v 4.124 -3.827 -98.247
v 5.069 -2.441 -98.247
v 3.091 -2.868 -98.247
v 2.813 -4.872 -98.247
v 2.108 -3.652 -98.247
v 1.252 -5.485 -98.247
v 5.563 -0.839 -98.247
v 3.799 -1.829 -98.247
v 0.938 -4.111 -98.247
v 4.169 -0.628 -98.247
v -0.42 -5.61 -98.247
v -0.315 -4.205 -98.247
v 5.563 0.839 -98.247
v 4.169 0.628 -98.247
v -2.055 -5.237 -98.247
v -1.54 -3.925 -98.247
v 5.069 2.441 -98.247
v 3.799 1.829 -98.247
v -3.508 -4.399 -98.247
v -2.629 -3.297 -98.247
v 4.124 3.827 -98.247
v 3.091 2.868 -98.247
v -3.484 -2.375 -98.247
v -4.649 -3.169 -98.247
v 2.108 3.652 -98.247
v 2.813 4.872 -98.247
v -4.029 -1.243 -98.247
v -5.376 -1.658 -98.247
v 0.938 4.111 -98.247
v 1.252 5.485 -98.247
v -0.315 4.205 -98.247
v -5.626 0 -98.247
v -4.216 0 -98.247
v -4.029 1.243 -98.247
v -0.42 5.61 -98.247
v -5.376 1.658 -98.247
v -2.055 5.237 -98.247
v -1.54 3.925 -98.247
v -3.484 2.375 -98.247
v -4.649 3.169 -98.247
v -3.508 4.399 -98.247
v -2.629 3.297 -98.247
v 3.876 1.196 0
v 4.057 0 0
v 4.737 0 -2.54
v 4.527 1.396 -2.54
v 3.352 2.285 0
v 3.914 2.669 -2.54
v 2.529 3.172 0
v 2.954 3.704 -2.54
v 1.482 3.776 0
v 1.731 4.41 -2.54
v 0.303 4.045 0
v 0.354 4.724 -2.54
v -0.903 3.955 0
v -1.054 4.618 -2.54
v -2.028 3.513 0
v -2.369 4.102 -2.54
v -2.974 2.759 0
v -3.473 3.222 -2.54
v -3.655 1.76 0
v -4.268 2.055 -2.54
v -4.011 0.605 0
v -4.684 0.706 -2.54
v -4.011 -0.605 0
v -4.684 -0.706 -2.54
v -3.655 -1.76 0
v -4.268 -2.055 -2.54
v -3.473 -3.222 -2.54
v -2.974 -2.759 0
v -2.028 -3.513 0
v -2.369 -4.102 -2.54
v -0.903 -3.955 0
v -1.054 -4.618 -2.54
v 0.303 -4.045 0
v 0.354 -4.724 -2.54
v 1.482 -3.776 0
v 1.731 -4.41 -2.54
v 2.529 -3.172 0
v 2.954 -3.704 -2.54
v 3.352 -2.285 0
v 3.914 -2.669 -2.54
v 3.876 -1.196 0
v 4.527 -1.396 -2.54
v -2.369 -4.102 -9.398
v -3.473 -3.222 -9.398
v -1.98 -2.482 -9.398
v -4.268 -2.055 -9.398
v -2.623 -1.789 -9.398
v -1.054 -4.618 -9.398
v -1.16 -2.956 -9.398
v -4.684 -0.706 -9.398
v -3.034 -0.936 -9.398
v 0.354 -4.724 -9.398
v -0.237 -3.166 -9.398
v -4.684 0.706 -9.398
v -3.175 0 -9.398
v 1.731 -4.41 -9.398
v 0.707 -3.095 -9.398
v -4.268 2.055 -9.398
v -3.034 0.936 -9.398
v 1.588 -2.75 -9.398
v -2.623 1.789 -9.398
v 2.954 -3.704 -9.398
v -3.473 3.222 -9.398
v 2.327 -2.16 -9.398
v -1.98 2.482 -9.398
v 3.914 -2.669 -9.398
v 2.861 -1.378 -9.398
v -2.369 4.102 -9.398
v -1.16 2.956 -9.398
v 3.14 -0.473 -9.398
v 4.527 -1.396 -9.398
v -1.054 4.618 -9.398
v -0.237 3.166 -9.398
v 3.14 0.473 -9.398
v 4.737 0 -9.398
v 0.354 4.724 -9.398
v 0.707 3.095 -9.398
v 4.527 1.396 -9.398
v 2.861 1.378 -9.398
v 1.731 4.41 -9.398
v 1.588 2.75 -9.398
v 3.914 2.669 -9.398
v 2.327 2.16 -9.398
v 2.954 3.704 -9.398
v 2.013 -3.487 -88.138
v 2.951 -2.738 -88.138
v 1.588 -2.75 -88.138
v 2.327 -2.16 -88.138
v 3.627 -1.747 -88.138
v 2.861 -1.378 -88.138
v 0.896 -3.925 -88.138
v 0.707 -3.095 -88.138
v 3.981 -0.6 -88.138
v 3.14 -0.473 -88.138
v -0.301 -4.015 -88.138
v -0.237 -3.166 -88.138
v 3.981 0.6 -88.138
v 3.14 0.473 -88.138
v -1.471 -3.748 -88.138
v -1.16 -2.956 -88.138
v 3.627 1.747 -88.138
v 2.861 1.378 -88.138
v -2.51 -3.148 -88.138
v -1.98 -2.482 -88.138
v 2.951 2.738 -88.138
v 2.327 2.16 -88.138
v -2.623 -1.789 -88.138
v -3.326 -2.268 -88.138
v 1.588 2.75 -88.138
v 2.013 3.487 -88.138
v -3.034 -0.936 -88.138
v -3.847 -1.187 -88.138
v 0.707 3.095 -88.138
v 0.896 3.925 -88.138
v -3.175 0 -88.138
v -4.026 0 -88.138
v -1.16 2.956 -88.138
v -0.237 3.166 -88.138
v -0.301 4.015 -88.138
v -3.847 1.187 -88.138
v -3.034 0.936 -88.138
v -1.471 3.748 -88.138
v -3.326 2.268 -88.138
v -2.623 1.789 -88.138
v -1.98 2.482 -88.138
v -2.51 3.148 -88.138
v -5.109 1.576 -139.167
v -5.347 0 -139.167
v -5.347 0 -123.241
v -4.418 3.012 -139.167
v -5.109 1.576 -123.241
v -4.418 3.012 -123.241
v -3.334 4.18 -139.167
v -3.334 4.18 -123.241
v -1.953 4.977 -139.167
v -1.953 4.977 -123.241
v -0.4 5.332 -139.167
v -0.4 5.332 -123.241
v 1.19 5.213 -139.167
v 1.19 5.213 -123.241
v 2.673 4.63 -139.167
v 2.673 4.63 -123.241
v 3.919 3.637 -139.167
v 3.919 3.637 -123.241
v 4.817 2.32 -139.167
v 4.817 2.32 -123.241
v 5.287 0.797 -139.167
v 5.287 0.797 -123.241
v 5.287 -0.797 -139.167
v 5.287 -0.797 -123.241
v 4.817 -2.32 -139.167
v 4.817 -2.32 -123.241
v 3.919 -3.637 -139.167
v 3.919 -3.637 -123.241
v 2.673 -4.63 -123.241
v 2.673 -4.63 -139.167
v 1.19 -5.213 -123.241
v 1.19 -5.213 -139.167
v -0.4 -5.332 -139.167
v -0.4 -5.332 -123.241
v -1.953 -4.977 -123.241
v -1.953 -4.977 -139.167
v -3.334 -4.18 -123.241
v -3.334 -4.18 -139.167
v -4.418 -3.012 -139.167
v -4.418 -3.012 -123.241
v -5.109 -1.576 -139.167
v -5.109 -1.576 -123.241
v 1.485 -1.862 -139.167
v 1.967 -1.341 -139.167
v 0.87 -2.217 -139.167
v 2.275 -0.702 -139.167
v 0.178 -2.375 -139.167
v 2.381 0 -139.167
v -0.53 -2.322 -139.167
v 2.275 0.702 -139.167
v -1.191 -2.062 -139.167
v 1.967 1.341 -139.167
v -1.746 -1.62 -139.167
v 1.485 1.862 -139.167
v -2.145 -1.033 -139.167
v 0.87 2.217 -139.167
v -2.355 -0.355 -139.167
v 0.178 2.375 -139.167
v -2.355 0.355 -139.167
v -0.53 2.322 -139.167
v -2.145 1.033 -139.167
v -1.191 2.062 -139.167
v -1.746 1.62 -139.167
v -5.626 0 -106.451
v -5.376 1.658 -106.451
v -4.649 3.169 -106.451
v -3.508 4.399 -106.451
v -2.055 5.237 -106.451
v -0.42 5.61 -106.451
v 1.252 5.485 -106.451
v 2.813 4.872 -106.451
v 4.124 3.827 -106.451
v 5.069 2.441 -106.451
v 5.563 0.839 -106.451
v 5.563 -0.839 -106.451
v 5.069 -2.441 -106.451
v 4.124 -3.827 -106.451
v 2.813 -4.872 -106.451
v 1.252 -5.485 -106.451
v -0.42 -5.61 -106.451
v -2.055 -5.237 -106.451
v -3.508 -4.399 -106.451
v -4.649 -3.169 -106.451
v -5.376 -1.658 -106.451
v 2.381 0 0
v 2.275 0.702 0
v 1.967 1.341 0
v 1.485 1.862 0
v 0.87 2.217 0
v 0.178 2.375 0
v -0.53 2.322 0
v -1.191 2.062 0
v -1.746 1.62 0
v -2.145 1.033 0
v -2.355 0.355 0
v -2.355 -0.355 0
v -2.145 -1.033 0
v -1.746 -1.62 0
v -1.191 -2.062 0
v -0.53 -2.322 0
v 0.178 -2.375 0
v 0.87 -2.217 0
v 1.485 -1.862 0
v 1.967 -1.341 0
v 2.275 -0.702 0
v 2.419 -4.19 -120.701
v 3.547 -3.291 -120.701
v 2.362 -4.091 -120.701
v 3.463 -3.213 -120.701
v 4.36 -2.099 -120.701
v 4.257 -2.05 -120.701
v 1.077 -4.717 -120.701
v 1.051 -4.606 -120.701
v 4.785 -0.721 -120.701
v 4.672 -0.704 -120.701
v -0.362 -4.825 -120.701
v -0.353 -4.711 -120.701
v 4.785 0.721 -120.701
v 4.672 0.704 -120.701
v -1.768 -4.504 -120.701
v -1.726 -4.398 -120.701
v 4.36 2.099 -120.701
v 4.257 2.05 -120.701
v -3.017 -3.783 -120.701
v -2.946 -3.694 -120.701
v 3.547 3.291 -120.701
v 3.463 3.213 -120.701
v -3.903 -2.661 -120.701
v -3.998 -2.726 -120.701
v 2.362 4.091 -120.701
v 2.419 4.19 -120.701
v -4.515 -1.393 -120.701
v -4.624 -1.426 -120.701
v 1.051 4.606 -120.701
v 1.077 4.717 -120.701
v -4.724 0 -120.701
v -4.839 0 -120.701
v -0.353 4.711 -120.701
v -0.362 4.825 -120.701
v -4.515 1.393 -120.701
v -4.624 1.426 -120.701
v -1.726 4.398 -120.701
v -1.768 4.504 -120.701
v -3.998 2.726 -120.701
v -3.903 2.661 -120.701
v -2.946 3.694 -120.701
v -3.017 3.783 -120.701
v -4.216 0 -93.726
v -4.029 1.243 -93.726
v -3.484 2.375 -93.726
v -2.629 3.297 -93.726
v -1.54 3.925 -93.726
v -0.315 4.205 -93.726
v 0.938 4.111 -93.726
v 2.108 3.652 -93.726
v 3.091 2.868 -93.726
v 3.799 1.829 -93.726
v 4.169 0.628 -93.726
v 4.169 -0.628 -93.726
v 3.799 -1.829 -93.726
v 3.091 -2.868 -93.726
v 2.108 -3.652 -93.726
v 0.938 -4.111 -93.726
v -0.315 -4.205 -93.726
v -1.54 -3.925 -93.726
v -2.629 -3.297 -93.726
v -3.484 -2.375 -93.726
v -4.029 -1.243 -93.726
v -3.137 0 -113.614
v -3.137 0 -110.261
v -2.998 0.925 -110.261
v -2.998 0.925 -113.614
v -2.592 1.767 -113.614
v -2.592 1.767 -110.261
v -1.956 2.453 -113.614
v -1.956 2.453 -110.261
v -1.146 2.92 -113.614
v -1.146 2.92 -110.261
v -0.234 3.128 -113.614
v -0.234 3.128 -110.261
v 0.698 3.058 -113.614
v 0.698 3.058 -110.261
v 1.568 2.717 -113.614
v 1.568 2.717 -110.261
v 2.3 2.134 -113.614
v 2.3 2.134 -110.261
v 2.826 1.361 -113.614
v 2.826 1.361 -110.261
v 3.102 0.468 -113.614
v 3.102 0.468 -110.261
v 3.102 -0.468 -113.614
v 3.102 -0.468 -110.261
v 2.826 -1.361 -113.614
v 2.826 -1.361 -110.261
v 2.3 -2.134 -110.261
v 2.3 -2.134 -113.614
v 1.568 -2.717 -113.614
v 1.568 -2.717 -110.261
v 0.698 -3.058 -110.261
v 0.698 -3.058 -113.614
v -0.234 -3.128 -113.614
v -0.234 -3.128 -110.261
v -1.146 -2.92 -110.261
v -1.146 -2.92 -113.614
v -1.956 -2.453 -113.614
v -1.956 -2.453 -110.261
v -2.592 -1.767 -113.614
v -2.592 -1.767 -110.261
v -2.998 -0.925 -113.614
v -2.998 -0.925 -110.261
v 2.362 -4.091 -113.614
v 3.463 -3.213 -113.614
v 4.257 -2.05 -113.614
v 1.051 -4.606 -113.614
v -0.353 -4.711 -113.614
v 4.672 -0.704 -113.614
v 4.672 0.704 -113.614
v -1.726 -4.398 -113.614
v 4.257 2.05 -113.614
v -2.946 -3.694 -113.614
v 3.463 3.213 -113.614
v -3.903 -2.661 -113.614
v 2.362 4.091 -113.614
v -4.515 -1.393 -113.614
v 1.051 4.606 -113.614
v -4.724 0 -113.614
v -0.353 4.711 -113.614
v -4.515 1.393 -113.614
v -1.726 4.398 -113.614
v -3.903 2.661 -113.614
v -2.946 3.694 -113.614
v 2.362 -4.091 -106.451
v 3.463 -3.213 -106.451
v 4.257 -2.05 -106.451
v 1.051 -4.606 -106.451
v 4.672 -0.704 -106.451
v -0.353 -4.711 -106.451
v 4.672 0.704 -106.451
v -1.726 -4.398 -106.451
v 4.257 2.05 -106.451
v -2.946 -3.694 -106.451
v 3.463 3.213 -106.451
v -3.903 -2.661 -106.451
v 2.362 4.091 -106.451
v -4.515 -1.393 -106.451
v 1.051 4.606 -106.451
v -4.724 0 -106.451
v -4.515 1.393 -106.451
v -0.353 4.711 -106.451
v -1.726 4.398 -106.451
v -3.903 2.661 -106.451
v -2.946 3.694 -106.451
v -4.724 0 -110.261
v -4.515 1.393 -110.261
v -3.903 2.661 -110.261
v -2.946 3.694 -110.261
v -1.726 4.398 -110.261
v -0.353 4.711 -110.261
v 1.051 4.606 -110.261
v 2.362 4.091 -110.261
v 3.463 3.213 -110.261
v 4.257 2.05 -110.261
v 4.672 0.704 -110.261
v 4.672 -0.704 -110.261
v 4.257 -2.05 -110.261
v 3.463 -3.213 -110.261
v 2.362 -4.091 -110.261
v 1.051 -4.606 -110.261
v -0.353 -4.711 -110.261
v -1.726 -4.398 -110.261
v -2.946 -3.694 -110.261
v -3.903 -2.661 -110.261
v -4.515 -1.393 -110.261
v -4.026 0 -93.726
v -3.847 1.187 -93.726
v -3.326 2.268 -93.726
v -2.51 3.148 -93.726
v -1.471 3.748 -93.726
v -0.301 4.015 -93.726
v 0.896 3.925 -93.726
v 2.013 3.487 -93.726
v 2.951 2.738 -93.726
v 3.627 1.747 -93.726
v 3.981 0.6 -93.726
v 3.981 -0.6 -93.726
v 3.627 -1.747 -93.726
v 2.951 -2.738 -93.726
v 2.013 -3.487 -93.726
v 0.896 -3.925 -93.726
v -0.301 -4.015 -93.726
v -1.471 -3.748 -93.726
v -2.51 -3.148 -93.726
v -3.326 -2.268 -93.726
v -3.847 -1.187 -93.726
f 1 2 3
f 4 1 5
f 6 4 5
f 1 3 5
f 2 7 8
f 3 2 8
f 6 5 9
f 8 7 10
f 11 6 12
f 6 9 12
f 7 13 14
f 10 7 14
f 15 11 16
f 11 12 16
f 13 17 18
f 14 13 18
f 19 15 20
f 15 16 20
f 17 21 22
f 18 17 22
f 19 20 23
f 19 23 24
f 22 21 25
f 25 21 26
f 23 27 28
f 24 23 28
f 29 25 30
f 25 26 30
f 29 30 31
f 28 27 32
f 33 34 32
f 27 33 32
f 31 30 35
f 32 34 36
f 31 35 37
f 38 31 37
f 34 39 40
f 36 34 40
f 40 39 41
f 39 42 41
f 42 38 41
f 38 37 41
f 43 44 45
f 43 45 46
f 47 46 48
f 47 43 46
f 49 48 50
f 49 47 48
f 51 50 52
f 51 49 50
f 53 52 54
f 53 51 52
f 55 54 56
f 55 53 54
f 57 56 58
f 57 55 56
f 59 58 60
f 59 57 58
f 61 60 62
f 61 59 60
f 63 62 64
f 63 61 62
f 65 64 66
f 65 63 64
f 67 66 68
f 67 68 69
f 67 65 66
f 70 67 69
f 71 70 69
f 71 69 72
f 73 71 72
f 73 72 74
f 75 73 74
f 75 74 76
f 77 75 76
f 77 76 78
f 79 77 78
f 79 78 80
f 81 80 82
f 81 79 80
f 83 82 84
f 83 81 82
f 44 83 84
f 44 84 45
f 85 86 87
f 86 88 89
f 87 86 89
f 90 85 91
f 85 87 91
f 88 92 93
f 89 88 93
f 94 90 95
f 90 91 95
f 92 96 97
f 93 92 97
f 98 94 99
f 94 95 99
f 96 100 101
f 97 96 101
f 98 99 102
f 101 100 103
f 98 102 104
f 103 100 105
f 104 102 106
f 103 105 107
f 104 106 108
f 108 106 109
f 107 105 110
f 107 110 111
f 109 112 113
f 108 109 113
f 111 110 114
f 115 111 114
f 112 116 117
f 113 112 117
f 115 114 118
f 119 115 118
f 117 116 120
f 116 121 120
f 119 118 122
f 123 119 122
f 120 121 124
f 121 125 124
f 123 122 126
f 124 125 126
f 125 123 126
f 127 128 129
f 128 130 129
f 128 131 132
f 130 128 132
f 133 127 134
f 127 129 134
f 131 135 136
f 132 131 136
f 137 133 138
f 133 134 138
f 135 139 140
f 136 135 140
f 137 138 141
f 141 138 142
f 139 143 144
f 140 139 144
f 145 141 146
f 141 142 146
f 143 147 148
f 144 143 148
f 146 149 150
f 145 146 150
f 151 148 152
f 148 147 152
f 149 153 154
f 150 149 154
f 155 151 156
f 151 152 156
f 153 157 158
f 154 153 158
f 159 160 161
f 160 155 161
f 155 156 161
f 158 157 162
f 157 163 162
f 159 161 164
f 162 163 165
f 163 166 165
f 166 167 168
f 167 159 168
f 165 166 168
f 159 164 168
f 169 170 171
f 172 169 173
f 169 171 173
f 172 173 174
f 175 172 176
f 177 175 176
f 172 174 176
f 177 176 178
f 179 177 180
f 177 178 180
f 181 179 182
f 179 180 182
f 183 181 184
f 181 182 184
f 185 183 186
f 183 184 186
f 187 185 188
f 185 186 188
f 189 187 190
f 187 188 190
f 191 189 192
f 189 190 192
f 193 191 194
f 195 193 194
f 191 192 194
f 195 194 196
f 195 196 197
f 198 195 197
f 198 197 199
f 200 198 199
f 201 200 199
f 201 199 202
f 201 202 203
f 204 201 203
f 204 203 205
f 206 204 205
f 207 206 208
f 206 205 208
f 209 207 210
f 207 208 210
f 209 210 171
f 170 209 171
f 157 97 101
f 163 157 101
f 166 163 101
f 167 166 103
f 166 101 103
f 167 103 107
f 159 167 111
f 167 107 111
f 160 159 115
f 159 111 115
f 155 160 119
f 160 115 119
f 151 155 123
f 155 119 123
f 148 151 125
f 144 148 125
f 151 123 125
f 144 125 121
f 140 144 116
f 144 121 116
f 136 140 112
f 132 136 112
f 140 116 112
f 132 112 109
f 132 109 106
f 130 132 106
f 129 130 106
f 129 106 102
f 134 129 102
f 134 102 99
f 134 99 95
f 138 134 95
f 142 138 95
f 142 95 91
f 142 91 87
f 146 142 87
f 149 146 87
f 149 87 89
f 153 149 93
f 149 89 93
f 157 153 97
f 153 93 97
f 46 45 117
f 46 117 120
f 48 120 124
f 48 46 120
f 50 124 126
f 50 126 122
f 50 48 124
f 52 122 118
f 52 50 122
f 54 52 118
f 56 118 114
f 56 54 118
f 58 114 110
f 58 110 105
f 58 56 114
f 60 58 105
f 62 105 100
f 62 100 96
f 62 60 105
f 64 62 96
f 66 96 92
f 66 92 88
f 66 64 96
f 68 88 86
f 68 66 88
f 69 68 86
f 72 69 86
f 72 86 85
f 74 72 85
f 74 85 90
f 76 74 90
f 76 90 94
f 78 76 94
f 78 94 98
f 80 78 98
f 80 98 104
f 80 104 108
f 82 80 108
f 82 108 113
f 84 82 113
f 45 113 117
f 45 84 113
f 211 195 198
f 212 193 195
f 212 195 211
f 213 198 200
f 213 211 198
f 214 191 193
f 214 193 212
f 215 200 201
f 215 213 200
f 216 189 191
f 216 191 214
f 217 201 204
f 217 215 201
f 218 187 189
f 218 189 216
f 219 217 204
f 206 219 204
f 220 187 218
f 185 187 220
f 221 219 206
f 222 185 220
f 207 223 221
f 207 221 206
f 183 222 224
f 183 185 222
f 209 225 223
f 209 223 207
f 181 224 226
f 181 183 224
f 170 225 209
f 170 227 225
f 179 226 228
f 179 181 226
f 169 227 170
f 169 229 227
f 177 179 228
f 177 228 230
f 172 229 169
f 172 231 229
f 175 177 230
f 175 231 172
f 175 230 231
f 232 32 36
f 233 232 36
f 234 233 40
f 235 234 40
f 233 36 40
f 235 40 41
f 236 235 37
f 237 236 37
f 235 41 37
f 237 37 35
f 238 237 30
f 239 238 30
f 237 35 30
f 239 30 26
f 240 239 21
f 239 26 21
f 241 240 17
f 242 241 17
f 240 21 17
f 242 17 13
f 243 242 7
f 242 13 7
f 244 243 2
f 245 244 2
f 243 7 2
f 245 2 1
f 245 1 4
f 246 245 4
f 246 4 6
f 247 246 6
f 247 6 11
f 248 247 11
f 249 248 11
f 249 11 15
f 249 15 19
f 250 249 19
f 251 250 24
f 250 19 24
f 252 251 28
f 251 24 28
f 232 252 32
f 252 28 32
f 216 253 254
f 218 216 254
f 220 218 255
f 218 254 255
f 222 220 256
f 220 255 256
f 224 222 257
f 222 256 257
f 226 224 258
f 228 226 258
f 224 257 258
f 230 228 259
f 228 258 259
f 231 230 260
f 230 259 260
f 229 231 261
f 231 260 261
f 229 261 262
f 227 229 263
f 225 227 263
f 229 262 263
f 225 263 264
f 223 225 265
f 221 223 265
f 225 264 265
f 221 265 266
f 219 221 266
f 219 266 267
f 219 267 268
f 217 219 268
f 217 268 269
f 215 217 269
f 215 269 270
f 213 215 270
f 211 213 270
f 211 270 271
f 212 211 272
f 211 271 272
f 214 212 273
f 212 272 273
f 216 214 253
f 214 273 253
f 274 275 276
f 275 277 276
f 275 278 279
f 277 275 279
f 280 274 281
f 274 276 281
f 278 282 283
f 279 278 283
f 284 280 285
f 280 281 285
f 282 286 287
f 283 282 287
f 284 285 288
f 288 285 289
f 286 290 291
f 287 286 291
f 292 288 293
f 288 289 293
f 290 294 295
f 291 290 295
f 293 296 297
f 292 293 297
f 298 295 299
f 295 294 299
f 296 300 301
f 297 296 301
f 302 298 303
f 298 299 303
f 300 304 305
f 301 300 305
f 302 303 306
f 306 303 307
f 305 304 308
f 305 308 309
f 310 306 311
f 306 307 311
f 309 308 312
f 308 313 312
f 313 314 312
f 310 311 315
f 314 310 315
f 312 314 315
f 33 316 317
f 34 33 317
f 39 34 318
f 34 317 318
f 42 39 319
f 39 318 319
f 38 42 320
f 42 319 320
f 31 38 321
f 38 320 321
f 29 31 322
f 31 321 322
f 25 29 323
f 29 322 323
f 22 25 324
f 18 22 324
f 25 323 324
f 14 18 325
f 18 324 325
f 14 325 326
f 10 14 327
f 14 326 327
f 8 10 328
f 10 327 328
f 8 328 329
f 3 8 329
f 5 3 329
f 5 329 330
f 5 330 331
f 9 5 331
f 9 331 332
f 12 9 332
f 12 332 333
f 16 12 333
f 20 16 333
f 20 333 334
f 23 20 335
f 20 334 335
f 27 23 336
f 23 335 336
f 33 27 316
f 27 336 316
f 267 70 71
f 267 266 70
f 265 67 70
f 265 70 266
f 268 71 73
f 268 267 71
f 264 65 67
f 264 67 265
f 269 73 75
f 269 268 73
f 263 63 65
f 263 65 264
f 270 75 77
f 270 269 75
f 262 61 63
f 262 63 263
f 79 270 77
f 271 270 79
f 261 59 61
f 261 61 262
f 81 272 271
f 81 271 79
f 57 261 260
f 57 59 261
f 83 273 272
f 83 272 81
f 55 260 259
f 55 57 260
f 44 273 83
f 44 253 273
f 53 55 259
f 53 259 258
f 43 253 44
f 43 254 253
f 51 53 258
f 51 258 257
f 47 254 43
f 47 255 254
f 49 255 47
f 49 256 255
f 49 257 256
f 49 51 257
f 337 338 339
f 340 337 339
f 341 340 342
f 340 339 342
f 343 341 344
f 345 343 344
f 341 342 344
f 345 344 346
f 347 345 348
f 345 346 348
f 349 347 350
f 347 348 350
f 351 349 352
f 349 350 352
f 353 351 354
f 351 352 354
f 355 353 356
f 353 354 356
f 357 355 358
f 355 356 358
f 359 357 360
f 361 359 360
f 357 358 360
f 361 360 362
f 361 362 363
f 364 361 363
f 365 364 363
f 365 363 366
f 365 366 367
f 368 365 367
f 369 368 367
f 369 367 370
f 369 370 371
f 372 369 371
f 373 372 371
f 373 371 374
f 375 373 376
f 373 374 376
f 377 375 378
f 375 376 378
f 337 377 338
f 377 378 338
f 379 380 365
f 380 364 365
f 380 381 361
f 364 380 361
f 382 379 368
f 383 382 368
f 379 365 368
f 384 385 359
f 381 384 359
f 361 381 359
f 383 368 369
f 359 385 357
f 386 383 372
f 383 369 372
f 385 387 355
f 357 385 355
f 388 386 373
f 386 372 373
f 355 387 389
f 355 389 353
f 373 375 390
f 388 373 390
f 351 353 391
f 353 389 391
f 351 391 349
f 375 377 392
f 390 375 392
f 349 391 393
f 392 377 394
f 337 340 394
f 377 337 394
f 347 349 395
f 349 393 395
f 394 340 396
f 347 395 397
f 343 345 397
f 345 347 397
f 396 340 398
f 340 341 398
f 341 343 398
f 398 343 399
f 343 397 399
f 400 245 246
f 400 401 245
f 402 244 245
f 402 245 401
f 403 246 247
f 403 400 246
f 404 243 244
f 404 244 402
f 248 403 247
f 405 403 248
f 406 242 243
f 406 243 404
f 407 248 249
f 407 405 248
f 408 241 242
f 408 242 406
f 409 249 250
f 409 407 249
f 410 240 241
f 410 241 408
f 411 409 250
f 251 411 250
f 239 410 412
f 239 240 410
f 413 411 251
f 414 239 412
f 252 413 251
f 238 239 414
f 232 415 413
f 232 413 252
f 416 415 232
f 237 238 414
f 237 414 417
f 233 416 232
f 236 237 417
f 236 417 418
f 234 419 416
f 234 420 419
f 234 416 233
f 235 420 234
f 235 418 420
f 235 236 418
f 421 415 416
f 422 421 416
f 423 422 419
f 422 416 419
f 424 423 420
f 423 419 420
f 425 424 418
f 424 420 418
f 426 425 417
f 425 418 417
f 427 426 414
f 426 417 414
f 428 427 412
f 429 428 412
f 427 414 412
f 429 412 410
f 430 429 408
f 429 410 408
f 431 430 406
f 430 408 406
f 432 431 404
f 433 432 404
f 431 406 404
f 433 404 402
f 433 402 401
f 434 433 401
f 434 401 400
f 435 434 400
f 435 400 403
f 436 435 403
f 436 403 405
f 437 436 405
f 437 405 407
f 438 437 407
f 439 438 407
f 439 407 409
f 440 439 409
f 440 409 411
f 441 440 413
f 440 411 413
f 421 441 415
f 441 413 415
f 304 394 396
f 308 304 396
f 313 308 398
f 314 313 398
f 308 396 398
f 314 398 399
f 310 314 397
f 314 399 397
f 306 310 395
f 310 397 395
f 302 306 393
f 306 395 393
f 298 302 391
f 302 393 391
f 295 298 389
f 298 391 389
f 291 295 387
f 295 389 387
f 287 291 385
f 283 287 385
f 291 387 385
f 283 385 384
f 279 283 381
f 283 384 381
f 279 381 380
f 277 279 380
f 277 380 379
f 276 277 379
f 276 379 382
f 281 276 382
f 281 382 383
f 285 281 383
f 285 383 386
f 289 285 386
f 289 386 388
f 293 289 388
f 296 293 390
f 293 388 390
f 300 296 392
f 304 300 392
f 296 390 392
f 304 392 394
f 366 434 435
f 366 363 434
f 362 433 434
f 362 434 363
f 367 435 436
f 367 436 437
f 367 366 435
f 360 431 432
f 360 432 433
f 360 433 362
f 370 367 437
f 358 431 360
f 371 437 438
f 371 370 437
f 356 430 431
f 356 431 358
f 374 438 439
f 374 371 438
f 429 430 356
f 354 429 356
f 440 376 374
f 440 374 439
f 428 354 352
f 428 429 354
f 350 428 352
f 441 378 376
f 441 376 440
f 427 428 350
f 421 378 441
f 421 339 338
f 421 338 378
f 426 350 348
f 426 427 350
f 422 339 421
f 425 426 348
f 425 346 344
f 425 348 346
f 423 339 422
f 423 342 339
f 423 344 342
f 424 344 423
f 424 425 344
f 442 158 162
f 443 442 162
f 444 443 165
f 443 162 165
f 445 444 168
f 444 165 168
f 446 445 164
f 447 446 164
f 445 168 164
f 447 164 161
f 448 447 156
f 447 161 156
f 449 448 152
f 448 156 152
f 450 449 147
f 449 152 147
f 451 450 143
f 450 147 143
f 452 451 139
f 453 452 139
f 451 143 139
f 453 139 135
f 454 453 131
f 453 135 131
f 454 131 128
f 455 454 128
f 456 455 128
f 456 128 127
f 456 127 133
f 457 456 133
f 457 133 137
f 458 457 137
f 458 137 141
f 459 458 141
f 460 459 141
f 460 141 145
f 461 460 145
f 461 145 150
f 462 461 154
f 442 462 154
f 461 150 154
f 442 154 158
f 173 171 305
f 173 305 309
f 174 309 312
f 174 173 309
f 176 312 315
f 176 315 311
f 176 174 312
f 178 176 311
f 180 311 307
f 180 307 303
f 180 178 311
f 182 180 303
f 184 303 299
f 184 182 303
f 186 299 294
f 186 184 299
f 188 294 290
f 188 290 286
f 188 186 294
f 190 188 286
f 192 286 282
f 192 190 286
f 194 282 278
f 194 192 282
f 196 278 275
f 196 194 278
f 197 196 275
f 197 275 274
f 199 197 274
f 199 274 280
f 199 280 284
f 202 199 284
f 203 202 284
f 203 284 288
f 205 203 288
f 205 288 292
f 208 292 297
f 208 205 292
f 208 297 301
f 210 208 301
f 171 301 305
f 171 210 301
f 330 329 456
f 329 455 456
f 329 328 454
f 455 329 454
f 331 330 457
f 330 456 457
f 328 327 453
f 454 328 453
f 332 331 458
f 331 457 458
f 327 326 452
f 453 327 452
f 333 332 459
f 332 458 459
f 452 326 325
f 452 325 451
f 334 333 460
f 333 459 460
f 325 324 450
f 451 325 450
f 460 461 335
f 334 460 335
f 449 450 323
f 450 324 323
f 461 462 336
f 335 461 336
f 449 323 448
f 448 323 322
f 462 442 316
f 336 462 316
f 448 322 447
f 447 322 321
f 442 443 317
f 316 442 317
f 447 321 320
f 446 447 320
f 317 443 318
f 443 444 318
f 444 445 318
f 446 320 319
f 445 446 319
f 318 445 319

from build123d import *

# Parameters (mm, degrees)
SKETCH1_R           = 4.7371
BOSS_EXTRUDE1_DEPTH = 9.398
SKETCH2_R           = 3.175
BOSS_EXTRUDE2_DEPTH = 78.74
SKETCH3_R           = 4.0259
BOSS_EXTRUDE3_DEPTH = 5.588
SKETCH4_R           = 4.2164
BOSS_EXTRUDE4_DEPTH = 4.5212
SKETCH5_R           = 5.6261
BOSS_EXTRUDE5_DEPTH = 8.2042
SKETCH6_R           = 4.7244
BOSS_EXTRUDE6_DEPTH = 3.81
SKETCH7_R           = 3.1369
BOSS_EXTRUDE7_DEPTH = 3.3528
SKETCH8_R           = 4.7244
BOSS_EXTRUDE8_DEPTH = 7.0866
SKETCH9_R           = 5.3467
BOSS_EXTRUDE9_DEPTH = 18.4658
CHAMFER3_SIZE       = 0.508
CHAMFER3_SIZE2      = 2.54
CHAMFER4_SIZE       = 2.54
CHAMFER4_SIZE2      = 0.680590949
SKETCH10_R          = 2.38125
CUT_EXTRUDE1_DEPTH  = 139.1666


with BuildPart() as part:
    # Sketch1 → Boss-Extrude1 (new body)
    with BuildSketch(Plane.XY):
        Circle(SKETCH1_R)
    extrude(amount=-BOSS_EXTRUDE1_DEPTH)

    # Sketch2 → Boss-Extrude2 (add)
    with BuildSketch(Plane(origin=(0, 0, -9.398), x_dir=(-1, 0, 0), z_dir=(0, 0, -1))):
        Circle(SKETCH2_R)
    extrude(amount=BOSS_EXTRUDE2_DEPTH)

    # Sketch3 → Boss-Extrude3 (add)
    with BuildSketch(Plane(origin=(0, 0, -88.138), x_dir=(-1, 0, 0), z_dir=(0, 0, -1))):
        Circle(SKETCH3_R)
    extrude(amount=BOSS_EXTRUDE3_DEPTH)

    # Sketch4 → Boss-Extrude4 (add)
    with BuildSketch(Plane(origin=(0, 0, -93.726), x_dir=(-1, 0, 0), z_dir=(0, 0, -1))):
        Circle(SKETCH4_R)
    extrude(amount=BOSS_EXTRUDE4_DEPTH)

    # Sketch5 → Boss-Extrude5 (add)
    with BuildSketch(Plane(origin=(0, 0, -98.2472), x_dir=(-1, 0, 0), z_dir=(0, 0, -1))):
        Circle(SKETCH5_R)
    extrude(amount=BOSS_EXTRUDE5_DEPTH)

    # Sketch6 → Boss-Extrude6 (add)
    with BuildSketch(Plane(origin=(0, 0, -106.4514), x_dir=(-1, 0, 0), z_dir=(0, 0, -1))):
        Circle(SKETCH6_R)
    extrude(amount=BOSS_EXTRUDE6_DEPTH)

    # Sketch7 → Boss-Extrude7 (add)
    with BuildSketch(Plane(origin=(0, 0, -110.2614), x_dir=(-1, 0, 0), z_dir=(0, 0, -1))):
        Circle(SKETCH7_R)
    extrude(amount=BOSS_EXTRUDE7_DEPTH)

    # Sketch8 → Boss-Extrude8 (add)
    with BuildSketch(Plane(origin=(0, 0, -113.6142), x_dir=(-1, 0, 0), z_dir=(0, 0, -1))):
        Circle(SKETCH8_R)
    extrude(amount=BOSS_EXTRUDE8_DEPTH)

    # Sketch9 → Boss-Extrude9 (add)
    with BuildSketch(Plane(origin=(0, 0, -120.7008), x_dir=(-1, 0, 0), z_dir=(0, 0, -1))):
        Circle(SKETCH9_R)
    extrude(amount=BOSS_EXTRUDE9_DEPTH)

    # Chamfer3
    chamfer3_edges = [part.edges().sort_by_distance(p)[0] for p in [
        (5.3467, 0, -120.7008),
    ]]
    chamfer3_side = [part.faces().sort_by_distance(p)[0] for p in [
        (5.195472487, 0, -120.7008),
    ]]
    chamfer(chamfer3_edges, length=CHAMFER3_SIZE, length2=CHAMFER3_SIZE2, reference=chamfer3_side[0])

    # Chamfer4
    chamfer4_edges = [part.edges().sort_by_distance(p)[0] for p in [
        (-4.7371, 0, 0),
    ]]
    chamfer4_side = [part.faces().sort_by_distance(p)[0] for p in [
        (-4.7371, 0, -4.699),
    ]]
    chamfer(chamfer4_edges, length=CHAMFER4_SIZE, length2=CHAMFER4_SIZE2, reference=chamfer4_side[0])

    # Sketch10 → Cut-Extrude1 (cut)
    with BuildSketch(Plane.XY):
        Circle(SKETCH10_R)
    extrude(amount=-CUT_EXTRUDE1_DEPTH, mode=Mode.SUBTRACT)


solid = part.part
